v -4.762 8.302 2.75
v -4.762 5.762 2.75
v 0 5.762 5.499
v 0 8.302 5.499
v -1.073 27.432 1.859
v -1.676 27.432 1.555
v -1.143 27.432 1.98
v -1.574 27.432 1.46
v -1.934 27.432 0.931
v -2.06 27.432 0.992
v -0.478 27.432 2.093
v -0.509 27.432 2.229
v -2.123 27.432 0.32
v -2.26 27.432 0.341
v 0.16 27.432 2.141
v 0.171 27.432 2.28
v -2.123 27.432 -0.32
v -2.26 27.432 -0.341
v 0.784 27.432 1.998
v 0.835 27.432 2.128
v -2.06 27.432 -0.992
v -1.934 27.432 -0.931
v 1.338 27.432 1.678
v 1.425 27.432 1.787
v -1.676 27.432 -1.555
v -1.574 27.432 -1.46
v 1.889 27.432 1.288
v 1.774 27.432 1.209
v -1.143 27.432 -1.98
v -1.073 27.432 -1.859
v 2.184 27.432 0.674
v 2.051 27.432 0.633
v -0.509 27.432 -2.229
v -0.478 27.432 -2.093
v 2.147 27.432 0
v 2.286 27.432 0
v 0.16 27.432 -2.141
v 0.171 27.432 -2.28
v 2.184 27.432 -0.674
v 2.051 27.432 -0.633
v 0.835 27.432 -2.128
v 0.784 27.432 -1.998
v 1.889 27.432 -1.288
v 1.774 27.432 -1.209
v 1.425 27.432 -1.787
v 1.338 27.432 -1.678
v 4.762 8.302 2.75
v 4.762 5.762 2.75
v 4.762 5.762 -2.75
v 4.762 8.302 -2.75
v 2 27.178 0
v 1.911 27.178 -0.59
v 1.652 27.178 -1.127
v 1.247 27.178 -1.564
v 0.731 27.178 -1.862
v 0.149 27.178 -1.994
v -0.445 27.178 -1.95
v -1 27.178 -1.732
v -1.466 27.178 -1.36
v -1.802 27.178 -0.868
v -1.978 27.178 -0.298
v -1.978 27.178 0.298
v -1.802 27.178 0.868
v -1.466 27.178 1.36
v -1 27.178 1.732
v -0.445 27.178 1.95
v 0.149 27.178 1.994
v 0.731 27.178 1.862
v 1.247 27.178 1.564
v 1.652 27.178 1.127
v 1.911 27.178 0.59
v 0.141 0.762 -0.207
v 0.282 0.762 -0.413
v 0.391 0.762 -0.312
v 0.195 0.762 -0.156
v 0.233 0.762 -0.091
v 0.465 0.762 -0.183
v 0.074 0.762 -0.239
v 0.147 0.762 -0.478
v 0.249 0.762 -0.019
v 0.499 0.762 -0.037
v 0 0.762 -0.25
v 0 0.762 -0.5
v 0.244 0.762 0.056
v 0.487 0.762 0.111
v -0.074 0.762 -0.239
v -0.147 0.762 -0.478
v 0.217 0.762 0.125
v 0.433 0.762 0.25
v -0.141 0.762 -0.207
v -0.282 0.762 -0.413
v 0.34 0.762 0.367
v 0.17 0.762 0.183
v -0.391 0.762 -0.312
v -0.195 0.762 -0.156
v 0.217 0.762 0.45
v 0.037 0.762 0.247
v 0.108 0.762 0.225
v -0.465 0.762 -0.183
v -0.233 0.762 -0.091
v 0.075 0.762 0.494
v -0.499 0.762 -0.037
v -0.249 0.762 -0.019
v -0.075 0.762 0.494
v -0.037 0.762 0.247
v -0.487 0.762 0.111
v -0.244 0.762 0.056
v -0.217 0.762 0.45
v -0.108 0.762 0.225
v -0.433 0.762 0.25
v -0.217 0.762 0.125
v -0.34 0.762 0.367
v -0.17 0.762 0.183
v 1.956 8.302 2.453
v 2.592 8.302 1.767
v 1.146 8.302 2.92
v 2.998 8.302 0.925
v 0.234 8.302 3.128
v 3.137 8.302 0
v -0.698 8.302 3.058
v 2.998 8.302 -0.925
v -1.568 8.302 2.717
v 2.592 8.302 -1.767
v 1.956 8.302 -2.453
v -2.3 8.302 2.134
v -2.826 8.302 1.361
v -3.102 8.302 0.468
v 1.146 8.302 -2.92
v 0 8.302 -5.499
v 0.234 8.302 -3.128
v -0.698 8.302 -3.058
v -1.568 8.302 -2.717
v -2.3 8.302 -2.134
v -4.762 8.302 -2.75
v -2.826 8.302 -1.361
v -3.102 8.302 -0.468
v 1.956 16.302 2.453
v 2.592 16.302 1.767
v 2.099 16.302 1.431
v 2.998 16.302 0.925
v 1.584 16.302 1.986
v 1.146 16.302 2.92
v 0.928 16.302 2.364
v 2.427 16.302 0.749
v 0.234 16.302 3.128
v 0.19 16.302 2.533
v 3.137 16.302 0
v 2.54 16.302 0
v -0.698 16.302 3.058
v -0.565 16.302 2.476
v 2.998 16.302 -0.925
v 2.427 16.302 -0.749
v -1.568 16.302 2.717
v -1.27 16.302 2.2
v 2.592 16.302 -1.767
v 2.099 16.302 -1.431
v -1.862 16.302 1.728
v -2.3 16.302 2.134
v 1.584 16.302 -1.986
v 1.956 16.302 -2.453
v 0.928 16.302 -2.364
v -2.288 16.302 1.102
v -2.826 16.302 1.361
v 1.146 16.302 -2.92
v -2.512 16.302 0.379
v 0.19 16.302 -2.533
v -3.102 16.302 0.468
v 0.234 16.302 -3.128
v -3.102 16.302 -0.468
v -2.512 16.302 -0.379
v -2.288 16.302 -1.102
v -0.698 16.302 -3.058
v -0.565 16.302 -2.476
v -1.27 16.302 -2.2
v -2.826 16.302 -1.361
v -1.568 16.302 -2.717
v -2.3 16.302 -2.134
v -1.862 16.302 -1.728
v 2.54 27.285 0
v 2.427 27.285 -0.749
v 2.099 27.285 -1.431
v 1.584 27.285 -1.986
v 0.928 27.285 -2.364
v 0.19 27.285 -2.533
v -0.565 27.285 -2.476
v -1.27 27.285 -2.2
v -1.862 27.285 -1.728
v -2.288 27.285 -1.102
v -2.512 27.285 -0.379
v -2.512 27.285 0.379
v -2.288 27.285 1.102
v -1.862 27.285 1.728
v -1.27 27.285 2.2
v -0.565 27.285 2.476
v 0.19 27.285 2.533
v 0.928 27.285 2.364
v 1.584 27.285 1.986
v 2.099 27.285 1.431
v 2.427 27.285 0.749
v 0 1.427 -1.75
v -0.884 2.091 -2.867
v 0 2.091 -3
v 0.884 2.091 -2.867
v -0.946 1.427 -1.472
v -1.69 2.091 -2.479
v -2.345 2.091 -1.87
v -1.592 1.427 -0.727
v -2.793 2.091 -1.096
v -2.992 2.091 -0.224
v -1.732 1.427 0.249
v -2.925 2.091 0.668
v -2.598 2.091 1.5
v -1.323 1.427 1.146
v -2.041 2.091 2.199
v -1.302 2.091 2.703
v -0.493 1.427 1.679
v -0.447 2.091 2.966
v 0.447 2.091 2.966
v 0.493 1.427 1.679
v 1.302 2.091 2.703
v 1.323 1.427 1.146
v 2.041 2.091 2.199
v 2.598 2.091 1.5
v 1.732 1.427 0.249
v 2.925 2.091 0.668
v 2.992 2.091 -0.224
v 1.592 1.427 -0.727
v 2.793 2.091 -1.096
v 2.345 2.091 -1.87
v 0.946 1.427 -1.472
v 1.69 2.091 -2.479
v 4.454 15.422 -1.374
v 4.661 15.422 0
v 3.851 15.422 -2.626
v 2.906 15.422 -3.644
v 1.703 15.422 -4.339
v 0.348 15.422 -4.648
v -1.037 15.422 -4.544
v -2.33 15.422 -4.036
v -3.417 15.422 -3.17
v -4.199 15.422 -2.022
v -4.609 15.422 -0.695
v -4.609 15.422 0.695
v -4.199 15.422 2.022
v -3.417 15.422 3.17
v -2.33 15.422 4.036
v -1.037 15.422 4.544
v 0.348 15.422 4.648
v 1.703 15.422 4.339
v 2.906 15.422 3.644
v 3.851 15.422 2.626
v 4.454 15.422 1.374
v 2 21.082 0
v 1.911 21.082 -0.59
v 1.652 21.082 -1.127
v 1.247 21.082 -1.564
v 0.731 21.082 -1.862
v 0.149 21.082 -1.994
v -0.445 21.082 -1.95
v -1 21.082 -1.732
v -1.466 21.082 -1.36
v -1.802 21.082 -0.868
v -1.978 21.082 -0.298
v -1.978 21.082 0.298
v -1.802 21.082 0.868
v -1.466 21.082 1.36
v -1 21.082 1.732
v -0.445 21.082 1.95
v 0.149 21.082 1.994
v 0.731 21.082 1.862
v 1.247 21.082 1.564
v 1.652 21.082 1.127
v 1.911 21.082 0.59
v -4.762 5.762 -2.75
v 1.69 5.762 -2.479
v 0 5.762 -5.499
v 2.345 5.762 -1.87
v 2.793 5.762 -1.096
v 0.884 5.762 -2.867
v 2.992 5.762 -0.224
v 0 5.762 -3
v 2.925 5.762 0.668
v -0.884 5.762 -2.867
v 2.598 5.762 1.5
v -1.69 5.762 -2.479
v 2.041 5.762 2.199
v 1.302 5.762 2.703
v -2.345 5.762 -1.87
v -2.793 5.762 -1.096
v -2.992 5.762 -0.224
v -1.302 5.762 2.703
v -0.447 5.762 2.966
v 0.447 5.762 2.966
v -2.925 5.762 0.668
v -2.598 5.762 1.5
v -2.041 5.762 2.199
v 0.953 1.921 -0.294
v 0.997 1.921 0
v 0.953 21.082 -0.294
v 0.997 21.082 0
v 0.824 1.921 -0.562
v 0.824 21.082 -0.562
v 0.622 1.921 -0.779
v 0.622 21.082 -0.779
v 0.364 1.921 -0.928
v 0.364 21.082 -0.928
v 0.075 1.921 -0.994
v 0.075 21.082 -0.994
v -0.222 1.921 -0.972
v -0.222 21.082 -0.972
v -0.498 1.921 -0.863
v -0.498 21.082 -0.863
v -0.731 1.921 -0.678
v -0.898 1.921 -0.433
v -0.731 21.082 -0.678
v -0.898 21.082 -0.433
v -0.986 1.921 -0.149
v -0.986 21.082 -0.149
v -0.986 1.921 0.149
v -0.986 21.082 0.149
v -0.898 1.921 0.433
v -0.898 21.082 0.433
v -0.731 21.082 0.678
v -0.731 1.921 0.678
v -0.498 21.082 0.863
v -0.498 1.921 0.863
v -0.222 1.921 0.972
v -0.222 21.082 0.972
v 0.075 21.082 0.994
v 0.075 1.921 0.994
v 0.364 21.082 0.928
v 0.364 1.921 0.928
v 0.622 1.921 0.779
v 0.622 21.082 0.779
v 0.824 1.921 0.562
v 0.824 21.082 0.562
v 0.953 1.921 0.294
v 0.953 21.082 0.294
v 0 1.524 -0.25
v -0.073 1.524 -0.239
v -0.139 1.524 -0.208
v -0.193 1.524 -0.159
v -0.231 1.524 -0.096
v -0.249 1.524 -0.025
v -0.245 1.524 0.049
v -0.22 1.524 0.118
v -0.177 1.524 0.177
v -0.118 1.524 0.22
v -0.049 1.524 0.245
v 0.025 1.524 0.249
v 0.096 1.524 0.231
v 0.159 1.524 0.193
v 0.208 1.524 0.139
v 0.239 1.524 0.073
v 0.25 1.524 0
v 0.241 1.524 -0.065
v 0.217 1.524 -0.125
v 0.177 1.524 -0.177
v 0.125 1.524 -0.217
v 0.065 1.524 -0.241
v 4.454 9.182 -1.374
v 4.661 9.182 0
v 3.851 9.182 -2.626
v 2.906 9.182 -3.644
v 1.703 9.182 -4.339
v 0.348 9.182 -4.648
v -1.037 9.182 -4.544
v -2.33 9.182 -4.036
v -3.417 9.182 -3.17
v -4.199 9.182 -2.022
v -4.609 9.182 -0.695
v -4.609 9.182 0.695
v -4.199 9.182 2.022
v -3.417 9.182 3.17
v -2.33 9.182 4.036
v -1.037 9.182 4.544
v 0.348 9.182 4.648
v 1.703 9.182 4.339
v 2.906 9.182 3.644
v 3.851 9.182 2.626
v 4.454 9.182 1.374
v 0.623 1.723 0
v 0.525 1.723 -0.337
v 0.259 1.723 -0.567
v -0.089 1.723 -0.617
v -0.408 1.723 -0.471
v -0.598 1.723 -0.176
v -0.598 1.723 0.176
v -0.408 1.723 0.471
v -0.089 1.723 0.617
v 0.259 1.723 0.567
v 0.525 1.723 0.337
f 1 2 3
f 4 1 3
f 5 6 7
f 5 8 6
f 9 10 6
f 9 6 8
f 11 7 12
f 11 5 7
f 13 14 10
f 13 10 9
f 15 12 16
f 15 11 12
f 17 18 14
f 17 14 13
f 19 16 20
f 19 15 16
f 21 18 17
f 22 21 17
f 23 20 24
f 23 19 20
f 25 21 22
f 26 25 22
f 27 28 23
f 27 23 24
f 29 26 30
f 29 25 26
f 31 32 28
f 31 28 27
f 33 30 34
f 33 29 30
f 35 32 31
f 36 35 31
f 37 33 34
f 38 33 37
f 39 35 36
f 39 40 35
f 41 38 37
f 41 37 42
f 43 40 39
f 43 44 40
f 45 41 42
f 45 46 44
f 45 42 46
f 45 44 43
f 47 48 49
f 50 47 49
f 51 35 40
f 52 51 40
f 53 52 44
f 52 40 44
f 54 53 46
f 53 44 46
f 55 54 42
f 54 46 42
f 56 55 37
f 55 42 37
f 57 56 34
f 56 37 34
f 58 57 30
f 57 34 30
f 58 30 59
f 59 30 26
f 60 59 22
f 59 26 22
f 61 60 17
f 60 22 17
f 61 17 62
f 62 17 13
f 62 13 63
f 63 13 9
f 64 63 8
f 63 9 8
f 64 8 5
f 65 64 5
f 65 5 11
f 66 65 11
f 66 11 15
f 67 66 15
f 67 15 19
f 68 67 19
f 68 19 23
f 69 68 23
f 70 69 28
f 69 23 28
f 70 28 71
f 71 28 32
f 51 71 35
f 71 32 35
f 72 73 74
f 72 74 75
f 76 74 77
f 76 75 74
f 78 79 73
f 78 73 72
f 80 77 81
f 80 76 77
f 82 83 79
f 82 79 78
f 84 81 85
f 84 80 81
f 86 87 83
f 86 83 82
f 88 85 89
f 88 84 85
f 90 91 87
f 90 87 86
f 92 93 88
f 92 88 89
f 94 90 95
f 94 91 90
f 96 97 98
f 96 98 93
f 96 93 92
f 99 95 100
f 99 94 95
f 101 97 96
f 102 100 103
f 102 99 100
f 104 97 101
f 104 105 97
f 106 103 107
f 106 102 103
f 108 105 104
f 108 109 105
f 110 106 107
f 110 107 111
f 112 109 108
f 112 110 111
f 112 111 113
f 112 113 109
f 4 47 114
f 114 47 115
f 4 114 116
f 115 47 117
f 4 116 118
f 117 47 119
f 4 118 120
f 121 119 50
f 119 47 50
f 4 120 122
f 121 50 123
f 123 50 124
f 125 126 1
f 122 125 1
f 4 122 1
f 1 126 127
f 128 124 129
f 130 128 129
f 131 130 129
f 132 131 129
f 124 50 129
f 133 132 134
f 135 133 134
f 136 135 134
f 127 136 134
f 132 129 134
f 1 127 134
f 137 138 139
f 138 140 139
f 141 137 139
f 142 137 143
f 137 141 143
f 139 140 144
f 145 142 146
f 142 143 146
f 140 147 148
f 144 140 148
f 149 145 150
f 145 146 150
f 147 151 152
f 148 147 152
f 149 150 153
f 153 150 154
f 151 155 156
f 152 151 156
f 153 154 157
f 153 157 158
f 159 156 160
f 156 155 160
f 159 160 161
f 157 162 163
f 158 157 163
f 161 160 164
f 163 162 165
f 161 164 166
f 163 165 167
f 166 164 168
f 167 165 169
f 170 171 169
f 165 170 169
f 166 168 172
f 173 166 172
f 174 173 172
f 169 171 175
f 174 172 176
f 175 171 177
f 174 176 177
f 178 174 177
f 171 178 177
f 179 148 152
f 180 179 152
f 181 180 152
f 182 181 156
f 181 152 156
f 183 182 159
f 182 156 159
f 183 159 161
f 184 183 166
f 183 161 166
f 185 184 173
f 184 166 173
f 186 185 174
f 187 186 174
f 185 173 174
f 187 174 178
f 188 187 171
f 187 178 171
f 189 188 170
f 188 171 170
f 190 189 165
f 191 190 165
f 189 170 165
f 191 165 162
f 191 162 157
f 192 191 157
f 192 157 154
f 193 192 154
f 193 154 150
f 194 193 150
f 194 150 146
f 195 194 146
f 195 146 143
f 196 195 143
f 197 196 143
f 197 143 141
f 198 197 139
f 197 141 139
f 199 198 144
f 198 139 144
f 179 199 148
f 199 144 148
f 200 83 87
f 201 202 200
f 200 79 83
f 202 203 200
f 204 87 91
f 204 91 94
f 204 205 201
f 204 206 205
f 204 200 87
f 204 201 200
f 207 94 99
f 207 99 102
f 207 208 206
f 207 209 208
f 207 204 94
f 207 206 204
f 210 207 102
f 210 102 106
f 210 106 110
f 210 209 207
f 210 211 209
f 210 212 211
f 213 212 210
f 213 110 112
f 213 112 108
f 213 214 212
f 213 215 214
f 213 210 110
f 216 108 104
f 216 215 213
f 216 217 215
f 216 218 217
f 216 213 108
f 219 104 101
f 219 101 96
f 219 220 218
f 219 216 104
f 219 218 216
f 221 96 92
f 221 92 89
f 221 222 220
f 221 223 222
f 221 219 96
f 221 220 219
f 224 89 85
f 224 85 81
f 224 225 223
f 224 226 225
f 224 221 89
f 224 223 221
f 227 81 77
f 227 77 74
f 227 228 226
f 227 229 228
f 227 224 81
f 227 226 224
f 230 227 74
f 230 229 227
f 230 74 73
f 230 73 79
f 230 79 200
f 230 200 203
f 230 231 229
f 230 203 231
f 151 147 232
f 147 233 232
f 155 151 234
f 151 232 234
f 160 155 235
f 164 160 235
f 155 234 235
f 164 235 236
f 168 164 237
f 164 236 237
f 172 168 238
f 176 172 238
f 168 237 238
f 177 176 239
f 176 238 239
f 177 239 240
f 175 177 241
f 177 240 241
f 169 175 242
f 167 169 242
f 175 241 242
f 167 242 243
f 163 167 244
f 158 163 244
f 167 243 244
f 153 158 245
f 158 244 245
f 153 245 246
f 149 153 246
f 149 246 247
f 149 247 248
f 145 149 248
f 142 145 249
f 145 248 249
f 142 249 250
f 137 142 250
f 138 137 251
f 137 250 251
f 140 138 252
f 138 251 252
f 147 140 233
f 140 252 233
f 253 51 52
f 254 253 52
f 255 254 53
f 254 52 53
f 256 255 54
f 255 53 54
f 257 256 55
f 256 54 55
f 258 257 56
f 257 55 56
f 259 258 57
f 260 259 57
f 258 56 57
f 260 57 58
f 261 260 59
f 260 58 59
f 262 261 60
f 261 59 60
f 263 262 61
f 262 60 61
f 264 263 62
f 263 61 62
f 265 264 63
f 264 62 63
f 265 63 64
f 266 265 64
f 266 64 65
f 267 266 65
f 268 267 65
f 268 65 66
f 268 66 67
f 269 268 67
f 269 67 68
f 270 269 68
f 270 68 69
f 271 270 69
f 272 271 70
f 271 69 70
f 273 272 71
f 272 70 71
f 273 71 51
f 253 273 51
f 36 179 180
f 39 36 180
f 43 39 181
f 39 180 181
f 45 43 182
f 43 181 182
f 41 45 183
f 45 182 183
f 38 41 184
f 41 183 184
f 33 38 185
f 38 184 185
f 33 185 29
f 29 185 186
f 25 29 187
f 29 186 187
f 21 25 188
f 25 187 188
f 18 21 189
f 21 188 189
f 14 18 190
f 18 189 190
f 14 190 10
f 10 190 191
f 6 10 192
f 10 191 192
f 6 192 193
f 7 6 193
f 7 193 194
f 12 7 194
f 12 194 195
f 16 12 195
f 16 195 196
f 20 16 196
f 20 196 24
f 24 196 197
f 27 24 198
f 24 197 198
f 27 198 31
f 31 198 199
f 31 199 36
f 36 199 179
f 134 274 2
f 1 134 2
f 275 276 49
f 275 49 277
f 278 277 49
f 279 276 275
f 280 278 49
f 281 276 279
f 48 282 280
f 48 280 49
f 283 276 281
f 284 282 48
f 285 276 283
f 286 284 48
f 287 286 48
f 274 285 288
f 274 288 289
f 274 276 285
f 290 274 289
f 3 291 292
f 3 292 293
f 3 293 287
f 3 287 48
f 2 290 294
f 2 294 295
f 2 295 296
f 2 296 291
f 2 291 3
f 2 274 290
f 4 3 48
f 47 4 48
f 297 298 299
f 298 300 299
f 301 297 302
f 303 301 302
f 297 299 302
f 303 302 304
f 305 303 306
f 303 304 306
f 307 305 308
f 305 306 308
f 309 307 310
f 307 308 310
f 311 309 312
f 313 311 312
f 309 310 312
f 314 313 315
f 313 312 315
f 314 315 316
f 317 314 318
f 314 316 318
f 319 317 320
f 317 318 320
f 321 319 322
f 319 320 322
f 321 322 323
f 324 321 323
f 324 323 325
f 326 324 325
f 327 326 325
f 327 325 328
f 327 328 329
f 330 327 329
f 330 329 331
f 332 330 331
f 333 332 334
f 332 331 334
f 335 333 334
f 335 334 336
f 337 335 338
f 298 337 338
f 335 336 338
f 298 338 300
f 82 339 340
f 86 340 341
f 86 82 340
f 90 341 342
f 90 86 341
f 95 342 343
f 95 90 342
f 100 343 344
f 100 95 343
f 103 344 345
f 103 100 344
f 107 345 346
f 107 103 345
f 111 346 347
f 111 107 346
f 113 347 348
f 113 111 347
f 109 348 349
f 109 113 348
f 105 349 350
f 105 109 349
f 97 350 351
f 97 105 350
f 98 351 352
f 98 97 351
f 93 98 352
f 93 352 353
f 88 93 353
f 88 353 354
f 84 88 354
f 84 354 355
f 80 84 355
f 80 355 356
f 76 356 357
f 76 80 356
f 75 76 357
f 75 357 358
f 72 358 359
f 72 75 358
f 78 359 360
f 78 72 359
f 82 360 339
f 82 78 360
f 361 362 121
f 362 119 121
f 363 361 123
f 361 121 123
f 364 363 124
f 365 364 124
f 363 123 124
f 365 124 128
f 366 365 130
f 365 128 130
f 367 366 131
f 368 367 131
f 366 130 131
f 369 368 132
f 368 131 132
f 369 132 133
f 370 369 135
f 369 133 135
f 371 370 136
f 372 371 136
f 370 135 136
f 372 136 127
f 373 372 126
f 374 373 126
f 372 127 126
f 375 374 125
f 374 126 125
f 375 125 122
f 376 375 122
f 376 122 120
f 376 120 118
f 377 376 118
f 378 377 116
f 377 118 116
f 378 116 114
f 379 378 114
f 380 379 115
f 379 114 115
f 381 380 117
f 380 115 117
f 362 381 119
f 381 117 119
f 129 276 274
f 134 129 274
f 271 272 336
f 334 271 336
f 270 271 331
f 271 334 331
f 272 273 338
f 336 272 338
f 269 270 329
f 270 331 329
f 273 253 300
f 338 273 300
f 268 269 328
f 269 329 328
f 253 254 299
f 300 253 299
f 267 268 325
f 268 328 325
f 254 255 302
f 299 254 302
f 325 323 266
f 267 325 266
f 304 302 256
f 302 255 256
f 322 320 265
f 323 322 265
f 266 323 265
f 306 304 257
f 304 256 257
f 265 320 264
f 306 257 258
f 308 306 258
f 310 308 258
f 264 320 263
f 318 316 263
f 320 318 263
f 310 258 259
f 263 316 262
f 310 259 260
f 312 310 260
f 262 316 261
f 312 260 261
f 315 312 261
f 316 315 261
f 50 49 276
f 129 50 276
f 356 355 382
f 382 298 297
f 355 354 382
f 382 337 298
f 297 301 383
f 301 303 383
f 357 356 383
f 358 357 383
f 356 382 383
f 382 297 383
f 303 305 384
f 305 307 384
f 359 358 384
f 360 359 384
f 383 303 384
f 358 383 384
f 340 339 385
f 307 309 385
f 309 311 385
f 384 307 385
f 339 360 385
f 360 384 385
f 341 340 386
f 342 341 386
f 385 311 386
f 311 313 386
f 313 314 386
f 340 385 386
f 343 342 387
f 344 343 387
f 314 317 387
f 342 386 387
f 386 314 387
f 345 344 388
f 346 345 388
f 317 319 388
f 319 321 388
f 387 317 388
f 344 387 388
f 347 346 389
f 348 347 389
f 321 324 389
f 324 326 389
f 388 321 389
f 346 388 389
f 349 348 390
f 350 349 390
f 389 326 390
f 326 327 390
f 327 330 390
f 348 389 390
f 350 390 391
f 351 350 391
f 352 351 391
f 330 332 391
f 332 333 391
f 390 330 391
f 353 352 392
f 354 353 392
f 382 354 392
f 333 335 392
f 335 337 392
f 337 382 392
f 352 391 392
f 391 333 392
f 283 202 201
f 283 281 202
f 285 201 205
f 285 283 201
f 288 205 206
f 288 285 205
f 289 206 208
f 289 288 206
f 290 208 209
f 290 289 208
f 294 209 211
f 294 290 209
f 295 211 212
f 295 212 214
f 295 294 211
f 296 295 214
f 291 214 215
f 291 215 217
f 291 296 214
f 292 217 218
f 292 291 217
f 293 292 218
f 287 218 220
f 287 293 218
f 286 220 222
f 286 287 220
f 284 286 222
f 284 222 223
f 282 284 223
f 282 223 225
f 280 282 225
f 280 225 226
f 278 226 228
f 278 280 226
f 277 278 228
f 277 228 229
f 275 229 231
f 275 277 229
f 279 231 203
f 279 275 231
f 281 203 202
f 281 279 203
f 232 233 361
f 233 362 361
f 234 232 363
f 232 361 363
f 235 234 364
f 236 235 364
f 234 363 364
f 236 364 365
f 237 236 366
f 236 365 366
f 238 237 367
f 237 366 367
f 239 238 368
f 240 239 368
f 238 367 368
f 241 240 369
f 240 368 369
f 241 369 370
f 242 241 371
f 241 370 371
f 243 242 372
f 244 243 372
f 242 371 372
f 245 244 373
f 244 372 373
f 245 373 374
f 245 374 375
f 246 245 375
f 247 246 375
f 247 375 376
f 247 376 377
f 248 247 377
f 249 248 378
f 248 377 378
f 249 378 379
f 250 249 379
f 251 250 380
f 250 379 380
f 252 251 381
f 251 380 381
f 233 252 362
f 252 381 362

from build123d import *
from OCP.BRepFilletAPI import BRepFilletAPI_MakeChamfer

# Parameters (mm, degrees)
BOSS_EXTRUDE1_DEPTH = 27.432
CHAMFER1_SIZE       = 0.254
CHAMFER1_SIZE2      = 0.146646968


# Read off the part's stored shape, not the designer's step: Cut-Revolve4
with BuildPart() as part:
    # Sketch3 → Boss-Extrude1 (new body)
    with BuildSketch(Plane(origin=(0, 0, 0), x_dir=(1, 0, 0), z_dir=(0, 1, 0))):
        Polygon((4.7625, 2.749630657), (0, 5.499261314), (-4.7625, 2.749630657), (-4.7625, -2.749630657), (0, -5.499261314), (4.7625, -2.749630657), align=None)
    extrude(amount=BOSS_EXTRUDE1_DEPTH)

    # Cut-Revolve4 outline → Cut-Revolve4 (revolve, cut)
    with BuildSketch(Plane.XY):
        Polygon((4.6609, 9.18188181), (3.1369, 8.302), (5.499261314, 8.302), (5.499261314, 27.432), (2.54, 27.432), (2.54, 16.302), (3.1369, 16.302), (4.6609, 15.42211819), align=None)
        Polygon((0.99695, 21.082), (2, 21.082), (2, 27.432), (0, 27.432), (0, 1.391072642), (0.99695, 1.92116036), align=None)
    revolve(axis=Axis((0, 0, 0), (0, 1, 0)), mode=Mode.SUBTRACT)

    # Chamfer1: one chamfer whose edges measure the first distance from different faces: ONE call of the kernel's chamfer builder (chamfer() names one face for all edges)
    chamfer1_edges_1 = [part.edges().sort_by_distance(p)[0] for p in [
        (-2.54, 27.432, 0),
    ]]
    chamfer1_side_1 = [part.faces().sort_by_distance(p)[0] for p in [
        (-2.468157951, 27.432, 0),
    ]]
    chamfer1_edges_2 = [part.edges().sort_by_distance(p)[0] for p in [
        (-2, 27.432, 0),
    ]]
    chamfer1_side_2 = [part.faces().sort_by_distance(p)[0] for p in [
        (-2, 24.257, 0),
    ]]
    chamfer1 = BRepFilletAPI_MakeChamfer(part.part.solid().wrapped)
    for e in chamfer1_edges_1:
        chamfer1.Add(CHAMFER1_SIZE, CHAMFER1_SIZE2, e.wrapped, chamfer1_side_1[0].wrapped)  # the first distance lies on this face
    for e in chamfer1_edges_2:
        chamfer1.Add(CHAMFER1_SIZE, CHAMFER1_SIZE2, e.wrapped, chamfer1_side_2[0].wrapped)  # the first distance lies on this face
    add(Compound.cast(chamfer1.Shape()), mode=Mode.REPLACE)

    # Sketch4 → Cut-Revolve5 (revolve, cut)
    with BuildSketch(Plane.XY, mode=Mode.PRIVATE) as cut_revolve5_sk:
        Polygon((-0.25, 0.762), (-0.5, 0.762), (-3, 2.091273579), (-3, 5.762), (-6.107414125, 5.762), (-6.107414125, 0), (0, 0), (0, 1.524), (-0.25, 1.524), align=None)
    revolve(cut_revolve5_sk.sketch.rotate(Axis((0, 0, 0), (0, 1, 0)), 270), axis=Axis((0, 0, 0), (0, 1, 0)), mode=Mode.SUBTRACT)


solid = part.part
